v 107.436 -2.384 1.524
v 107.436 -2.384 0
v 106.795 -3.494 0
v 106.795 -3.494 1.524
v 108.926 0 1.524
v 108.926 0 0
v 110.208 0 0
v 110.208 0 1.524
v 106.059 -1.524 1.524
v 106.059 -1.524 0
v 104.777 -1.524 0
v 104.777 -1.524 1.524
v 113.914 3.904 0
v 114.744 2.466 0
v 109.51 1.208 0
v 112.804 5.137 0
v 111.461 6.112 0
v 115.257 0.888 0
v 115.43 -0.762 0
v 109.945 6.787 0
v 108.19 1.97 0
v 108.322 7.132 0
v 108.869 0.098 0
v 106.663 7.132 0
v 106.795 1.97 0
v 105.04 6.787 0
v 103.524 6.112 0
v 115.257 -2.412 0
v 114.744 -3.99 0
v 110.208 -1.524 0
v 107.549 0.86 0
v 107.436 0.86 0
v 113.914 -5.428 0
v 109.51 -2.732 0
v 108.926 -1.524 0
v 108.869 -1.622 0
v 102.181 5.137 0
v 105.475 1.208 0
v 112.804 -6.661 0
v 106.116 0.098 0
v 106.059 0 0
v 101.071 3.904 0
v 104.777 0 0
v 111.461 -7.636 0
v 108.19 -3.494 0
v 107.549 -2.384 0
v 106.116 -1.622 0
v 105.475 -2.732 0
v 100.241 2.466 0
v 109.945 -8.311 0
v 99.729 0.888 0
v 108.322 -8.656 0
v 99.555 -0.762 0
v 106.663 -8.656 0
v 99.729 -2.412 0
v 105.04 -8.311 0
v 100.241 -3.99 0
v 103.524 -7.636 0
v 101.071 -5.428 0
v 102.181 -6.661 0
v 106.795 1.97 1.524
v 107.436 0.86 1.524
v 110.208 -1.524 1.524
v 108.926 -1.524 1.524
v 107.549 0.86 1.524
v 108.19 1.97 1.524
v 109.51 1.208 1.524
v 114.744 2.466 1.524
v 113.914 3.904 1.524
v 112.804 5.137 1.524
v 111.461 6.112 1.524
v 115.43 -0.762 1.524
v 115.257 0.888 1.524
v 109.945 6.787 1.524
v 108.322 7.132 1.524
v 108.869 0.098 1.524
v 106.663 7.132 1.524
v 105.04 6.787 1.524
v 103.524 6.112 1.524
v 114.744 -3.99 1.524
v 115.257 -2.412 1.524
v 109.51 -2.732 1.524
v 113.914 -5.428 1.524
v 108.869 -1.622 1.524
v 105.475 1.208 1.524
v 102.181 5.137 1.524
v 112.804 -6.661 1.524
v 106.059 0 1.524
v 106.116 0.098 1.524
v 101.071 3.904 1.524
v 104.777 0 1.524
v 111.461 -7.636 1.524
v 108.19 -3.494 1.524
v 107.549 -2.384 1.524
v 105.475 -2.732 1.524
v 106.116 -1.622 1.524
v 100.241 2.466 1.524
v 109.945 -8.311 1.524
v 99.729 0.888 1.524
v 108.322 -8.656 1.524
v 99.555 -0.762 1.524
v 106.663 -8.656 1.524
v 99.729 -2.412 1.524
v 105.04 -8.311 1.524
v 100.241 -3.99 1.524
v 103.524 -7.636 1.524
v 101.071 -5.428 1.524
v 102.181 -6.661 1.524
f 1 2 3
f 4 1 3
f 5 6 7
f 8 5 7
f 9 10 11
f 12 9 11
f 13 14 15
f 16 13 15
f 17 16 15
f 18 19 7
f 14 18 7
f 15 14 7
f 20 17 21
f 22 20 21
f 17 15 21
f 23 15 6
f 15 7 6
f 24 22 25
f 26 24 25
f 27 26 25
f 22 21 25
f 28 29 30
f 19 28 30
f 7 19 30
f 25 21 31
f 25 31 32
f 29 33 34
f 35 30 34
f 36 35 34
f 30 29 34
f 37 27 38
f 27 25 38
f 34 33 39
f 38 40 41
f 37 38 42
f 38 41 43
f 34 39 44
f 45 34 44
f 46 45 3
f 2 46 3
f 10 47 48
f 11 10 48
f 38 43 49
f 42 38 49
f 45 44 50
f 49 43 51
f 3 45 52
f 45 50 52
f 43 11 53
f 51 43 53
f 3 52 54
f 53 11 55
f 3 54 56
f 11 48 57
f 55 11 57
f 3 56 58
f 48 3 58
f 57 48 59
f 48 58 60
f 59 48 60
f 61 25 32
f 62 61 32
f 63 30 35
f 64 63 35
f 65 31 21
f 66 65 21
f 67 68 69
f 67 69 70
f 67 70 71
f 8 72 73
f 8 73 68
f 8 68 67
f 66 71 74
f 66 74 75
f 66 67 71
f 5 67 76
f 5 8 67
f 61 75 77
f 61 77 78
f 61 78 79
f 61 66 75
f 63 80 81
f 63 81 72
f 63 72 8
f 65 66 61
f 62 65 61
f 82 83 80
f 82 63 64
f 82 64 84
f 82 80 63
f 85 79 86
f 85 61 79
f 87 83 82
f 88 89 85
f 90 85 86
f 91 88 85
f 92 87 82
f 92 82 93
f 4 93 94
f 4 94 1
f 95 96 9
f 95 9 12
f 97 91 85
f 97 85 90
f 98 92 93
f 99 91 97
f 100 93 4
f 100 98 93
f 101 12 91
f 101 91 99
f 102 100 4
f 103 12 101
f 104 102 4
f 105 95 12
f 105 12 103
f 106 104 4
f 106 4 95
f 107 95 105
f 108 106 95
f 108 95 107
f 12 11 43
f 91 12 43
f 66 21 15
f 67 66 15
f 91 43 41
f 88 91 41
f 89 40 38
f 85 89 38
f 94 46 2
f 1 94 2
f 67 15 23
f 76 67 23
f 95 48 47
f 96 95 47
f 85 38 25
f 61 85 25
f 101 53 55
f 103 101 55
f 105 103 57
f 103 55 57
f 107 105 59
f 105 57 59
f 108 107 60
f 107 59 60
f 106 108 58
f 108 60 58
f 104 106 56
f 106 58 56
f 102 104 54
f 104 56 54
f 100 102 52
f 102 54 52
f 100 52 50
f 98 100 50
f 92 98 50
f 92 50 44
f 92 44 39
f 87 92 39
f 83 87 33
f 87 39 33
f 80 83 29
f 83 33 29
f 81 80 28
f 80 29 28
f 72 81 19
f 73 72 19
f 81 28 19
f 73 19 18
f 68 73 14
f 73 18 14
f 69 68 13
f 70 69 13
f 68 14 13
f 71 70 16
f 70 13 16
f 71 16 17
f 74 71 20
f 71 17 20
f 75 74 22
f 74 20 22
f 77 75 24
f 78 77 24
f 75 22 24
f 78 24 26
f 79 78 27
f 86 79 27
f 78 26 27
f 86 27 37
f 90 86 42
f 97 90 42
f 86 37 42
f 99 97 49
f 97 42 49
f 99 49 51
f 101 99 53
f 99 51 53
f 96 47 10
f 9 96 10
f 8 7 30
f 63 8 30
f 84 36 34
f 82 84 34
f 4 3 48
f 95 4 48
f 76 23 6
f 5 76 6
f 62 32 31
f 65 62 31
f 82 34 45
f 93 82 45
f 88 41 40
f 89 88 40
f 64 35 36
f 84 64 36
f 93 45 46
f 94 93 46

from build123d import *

# Parameters (mm, degrees)
SKETCH1_R           = 7.9375
BOSS_EXTRUDE1_DEPTH = 1.524


with BuildPart() as part:
    # Sketch1 → Boss-Extrude1 (new body)
    with BuildSketch(Plane.XY):
        with Locations(Location((107.492585866, -0.762, 0), (0, 0, 180))):
            Circle(SKETCH1_R)
        Polygon((110.207675722, 0), (110.207675722, -1.524), (108.925853356, -1.524), (108.869130969, -1.622246056), (109.510042152, -2.732336789), (108.190219437, -3.494336789), (107.549308253, -2.384246056), (107.435863479, -2.384246056), (106.794952296, -3.494336789), (105.47512958, -2.732336789), (106.116040764, -1.622246056), (106.059318377, -1.524), (104.77749601, -1.524), (104.77749601, 0), (106.059318377, 0), (106.116040764, 0.098246056), (105.47512958, 1.208336789), (106.794952296, 1.970336789), (107.435863479, 0.860246056), (107.549308253, 0.860246056), (108.190219437, 1.970336789), (109.510042152, 1.208336789), (108.869130969, 0.098246056), (108.925853356, 0), align=None, mode=Mode.SUBTRACT)
    extrude(amount=BOSS_EXTRUDE1_DEPTH)


solid = part.part
